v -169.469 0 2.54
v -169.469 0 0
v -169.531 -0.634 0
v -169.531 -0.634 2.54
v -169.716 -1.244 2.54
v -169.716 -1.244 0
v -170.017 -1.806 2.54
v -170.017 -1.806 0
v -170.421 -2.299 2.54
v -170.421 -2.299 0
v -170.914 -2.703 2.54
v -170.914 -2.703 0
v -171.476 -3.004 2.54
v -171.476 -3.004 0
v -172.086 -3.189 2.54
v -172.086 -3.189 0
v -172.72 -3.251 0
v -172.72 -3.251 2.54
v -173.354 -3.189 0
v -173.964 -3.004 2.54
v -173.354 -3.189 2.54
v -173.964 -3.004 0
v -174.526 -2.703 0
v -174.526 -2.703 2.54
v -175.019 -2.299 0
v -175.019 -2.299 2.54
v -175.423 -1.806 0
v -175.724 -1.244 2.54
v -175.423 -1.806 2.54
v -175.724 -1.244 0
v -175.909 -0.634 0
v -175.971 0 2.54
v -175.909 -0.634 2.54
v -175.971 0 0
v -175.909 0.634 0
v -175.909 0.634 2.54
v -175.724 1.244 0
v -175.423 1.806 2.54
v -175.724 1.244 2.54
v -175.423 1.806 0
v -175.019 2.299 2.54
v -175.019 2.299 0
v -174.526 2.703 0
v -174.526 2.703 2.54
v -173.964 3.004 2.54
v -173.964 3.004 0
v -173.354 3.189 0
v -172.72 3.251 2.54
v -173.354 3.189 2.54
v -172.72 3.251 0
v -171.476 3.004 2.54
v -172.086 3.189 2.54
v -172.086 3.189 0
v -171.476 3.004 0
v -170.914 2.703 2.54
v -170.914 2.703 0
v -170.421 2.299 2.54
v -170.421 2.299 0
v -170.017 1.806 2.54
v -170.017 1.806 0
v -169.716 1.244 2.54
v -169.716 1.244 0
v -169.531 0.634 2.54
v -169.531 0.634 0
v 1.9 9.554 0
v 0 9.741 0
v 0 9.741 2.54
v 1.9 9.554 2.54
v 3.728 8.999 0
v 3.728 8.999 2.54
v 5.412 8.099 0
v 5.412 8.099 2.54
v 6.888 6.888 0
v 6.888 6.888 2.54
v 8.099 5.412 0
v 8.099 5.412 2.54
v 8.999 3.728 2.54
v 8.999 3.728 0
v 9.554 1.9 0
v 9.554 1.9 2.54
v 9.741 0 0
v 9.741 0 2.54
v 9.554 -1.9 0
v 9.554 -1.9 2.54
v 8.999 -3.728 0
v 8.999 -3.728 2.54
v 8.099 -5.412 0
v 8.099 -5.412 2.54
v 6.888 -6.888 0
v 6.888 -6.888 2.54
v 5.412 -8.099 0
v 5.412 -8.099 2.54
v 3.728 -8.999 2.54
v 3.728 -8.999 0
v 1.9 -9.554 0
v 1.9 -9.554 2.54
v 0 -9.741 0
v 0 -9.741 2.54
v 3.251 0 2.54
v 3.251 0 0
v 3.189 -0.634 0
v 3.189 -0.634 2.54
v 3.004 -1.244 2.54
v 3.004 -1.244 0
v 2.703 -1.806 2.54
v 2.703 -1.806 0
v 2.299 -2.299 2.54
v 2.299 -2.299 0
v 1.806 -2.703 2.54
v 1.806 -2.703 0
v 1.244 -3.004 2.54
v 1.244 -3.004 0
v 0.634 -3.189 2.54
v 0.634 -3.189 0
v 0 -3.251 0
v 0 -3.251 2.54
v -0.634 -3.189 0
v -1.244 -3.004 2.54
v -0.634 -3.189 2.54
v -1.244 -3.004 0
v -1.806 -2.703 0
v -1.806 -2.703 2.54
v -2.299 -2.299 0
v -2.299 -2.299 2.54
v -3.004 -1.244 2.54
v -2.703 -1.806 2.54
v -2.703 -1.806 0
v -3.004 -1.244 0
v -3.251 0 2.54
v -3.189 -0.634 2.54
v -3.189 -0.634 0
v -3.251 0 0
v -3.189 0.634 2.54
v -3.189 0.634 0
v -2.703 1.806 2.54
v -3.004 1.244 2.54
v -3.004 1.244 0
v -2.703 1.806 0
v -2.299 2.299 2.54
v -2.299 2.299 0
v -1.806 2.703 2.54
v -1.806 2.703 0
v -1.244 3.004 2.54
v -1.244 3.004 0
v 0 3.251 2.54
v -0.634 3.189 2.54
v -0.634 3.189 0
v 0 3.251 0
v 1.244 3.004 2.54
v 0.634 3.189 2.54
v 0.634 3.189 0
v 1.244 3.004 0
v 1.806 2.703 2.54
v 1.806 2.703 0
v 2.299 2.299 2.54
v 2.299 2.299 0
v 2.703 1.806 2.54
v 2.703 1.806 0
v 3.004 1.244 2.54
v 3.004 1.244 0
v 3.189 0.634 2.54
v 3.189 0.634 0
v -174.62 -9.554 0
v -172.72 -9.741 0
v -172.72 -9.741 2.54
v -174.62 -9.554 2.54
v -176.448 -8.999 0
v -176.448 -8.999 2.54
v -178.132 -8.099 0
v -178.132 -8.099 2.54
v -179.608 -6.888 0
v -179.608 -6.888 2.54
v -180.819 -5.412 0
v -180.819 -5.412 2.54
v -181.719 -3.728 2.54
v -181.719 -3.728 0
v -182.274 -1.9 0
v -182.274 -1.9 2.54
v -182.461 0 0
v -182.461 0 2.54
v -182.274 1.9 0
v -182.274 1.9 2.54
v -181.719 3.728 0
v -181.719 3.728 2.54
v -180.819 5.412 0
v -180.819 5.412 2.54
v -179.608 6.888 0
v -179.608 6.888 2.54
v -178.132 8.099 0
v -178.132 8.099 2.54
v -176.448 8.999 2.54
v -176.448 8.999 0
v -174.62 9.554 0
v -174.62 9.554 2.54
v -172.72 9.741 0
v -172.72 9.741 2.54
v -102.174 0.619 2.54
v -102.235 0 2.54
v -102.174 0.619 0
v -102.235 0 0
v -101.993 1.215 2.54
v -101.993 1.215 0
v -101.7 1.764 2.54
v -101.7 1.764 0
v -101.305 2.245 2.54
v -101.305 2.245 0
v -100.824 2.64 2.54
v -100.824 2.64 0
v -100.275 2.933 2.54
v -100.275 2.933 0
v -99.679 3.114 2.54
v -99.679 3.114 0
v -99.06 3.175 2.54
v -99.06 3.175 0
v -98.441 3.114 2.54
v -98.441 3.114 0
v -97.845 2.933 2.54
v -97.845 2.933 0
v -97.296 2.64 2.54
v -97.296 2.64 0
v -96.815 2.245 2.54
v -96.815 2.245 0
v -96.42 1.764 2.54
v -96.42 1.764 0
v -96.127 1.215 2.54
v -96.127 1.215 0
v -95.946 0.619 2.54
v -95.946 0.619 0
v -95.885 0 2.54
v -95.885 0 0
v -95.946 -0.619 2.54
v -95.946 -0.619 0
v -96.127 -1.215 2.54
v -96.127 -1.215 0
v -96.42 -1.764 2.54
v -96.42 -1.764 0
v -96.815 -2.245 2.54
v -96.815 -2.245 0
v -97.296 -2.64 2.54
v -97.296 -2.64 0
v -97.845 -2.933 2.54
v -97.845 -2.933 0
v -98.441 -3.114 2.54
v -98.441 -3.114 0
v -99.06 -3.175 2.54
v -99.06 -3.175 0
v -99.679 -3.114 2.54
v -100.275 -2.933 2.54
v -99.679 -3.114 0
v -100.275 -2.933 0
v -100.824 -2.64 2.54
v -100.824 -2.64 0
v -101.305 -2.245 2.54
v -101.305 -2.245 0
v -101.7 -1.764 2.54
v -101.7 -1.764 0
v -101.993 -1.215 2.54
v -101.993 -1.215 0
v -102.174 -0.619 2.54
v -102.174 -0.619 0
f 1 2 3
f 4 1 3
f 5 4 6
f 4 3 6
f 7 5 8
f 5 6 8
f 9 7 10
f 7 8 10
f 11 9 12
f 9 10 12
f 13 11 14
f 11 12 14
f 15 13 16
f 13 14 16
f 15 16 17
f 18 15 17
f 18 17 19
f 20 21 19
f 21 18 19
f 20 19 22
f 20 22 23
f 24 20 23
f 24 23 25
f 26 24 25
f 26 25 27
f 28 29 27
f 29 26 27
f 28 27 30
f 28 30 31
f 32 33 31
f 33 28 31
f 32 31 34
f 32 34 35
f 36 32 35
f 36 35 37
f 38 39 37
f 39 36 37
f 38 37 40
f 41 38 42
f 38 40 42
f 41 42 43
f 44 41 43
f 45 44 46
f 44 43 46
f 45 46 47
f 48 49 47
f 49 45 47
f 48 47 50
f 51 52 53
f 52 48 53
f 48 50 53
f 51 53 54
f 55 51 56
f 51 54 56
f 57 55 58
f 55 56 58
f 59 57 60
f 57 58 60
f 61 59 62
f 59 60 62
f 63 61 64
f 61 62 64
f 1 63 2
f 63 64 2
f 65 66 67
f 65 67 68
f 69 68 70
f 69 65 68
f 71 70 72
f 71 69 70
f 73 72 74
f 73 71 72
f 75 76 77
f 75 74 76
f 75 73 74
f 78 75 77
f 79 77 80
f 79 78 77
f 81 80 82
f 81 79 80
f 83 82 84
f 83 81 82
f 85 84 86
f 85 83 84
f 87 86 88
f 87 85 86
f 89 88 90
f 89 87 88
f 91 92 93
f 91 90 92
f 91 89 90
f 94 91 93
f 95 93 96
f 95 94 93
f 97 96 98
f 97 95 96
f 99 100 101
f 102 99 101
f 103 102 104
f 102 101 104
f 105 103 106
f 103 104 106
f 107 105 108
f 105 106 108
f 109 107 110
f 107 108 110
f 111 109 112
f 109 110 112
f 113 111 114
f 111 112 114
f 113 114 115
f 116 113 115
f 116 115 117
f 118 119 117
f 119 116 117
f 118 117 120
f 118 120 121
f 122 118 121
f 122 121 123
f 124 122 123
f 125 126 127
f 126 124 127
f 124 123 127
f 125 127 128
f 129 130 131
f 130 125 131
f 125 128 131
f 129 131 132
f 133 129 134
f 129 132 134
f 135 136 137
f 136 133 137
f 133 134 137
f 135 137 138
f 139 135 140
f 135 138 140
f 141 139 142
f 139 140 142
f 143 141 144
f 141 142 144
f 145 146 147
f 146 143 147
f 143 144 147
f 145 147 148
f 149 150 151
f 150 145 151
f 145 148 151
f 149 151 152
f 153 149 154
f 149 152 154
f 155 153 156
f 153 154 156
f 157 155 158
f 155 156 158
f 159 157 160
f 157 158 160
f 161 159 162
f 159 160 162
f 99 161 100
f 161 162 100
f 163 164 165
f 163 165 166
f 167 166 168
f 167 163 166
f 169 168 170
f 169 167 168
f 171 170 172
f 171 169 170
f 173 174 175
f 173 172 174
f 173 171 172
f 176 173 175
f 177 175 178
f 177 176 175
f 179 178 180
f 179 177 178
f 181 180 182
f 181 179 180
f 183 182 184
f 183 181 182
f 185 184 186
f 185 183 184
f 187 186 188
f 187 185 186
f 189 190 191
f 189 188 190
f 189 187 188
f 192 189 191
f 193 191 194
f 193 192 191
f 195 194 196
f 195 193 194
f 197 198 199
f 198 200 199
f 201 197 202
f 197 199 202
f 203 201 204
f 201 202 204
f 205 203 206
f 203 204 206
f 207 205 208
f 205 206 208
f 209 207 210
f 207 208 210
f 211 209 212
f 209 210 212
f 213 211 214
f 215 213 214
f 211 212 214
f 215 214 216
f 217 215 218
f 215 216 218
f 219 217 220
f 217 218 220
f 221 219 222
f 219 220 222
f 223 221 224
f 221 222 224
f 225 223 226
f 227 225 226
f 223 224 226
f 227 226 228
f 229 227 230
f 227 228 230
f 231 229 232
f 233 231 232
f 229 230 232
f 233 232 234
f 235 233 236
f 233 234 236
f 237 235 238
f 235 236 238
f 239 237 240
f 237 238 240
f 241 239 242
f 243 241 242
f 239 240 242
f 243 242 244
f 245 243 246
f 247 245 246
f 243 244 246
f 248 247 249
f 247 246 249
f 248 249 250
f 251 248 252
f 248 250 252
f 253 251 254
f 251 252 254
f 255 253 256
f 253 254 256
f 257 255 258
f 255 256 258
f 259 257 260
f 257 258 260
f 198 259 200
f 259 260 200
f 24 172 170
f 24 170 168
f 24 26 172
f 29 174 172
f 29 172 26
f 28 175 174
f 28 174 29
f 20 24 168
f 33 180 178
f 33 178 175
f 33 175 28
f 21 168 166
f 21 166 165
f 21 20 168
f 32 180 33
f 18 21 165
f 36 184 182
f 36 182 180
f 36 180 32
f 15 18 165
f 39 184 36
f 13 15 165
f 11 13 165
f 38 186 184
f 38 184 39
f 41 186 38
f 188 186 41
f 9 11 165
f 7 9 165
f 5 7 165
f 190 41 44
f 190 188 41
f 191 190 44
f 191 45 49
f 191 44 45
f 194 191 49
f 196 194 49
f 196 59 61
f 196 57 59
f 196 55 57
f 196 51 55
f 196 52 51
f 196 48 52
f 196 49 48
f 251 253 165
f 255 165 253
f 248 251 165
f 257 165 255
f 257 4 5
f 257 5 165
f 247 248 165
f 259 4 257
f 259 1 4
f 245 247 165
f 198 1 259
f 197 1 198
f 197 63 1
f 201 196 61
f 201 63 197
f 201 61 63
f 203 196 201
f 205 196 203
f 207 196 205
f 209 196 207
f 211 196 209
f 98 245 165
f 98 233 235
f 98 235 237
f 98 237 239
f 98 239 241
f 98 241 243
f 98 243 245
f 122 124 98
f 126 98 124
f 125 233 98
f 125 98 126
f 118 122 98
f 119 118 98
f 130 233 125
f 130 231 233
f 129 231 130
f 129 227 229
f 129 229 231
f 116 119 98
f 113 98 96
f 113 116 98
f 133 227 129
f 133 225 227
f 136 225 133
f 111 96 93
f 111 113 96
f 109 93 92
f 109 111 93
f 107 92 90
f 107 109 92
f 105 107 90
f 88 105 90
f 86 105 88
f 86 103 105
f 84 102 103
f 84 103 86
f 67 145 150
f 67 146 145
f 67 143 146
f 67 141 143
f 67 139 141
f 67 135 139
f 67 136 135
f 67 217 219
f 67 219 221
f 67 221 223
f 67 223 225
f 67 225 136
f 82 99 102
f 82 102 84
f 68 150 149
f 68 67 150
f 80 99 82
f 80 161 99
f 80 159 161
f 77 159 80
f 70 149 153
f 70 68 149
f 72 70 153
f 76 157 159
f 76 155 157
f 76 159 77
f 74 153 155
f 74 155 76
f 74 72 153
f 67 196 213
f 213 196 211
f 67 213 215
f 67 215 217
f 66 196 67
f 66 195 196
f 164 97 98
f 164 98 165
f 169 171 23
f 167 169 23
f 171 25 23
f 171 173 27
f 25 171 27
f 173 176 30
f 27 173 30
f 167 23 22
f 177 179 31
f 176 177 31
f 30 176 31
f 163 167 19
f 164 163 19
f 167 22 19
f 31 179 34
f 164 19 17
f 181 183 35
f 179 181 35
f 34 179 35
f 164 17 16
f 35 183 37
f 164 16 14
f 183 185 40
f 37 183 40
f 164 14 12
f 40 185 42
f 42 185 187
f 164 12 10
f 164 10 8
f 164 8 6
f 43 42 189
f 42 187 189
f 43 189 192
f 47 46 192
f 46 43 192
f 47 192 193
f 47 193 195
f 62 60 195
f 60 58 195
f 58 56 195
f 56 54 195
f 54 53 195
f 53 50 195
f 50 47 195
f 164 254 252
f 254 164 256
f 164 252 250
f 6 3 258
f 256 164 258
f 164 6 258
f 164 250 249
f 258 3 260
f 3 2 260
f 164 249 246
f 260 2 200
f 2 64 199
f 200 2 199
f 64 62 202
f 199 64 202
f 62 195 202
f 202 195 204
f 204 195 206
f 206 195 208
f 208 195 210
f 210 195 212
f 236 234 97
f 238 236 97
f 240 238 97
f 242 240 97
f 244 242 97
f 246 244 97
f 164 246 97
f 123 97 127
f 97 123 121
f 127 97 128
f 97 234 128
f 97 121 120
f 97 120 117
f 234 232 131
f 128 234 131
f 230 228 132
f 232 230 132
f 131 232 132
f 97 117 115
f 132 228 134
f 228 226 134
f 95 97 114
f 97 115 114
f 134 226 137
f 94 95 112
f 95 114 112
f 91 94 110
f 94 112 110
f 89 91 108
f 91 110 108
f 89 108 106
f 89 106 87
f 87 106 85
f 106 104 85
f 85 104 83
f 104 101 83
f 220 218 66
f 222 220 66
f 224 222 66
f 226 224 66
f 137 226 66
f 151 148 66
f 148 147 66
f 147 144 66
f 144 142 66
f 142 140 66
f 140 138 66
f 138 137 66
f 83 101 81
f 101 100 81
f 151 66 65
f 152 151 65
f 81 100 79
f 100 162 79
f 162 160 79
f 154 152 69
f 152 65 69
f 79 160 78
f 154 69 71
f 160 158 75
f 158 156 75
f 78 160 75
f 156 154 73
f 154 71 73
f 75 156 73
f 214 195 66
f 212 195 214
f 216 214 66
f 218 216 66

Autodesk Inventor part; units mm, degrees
ref_plane "YZ Plane" through (0, 0, 0) normal (1, 0, 0) x (0, 1, 0)
ref_plane "XZ Plane" through (0, 0, 0) normal (0, 1, 0) x (-1, 0, 0)
ref_plane "XY Plane" through (0, 0, 0) normal (0, 0, 1) x (1, 0, 0)
sketch "Sketch1" plane through (0, 0, 0) normal (0, 0, 1) x (1, 0, 0)
  arc A0 (0, -9.7409) -> (0, 9.7409) centre (0, 0) ccw
  arc A1 (-172.72, 9.7409) -> (-172.72, -9.7409) centre (-172.72, 0) ccw
  line L0 (-172.72, 9.7409) -> (0, 9.7409)
  line L1 (0, -9.7409) -> (-172.72, -9.7409)
  circle A2 centre (-172.72, 0) radius 3.2512
  circle A3 centre (0, 0) radius 3.2512
  circle A4 centre (-83.82, 0) radius 3.2512
  dimension "d0" = 19.4818
  dimension "d1" = 19.4818
  dimension "d2" = 172.72
  dimension "d3" = 6.5024
  dimension "d4" = 6.5024
  dimension "d12" = 6.5024
  dimension "d13" = 9.7409
  dimension "d14" = 88.9
extrude "Extrusion1" add sketch "Sketch1" along normal blind 2.54 contours L1 A1 L0 A0 | A4
sketch "Sketch2" plane through (0, 0, 0) normal (0, 0, -1) x (-1, 0, 0)
  circle A0 centre (99.06, 0) radius 3.175
  circle A1 centre (172.72, 0) radius 3.2512 projected
  circle A2 centre (0, 0) radius 3.2512 projected
  line L0 (172.72, 9.7409) -> (0, 9.7409) projected
  arc A3 (0, 9.7409) -> (0, -9.7409) centre (0, 0) ccw projected
  line L1 (0, -9.7409) -> (172.72, -9.7409) projected
  arc A4 (172.72, -9.7409) -> (172.72, 9.7409) centre (172.72, 0) ccw projected
  point P0 (86.36, 9.7409)
  dimension "d7" = 6.35
  dimension "d11" = 73.66
extrude "Extrusion2" cut sketch "Sketch2" against normal through all contours A0
equation "\"d0\" = d1"
properties part number "ArmConnector2"
